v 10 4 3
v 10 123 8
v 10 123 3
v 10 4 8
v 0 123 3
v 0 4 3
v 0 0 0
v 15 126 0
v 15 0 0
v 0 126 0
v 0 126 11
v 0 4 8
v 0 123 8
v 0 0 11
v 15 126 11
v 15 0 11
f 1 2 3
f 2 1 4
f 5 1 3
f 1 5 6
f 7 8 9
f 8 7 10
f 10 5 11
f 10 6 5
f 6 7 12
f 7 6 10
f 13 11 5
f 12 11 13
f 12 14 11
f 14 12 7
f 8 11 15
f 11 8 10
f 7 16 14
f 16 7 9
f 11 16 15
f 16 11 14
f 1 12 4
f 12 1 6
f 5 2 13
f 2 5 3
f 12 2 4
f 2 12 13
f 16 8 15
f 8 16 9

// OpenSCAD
module connector(length=10, width=200, space=5, deep=10){
    
cube([length,width,thick]);

translate([length-deep,0,0])
    cube([deep,4,6+space]);
translate([length-deep,width-thick,0])
    cube([deep,3,6+space]);
}

space=5;
mcx = 100;
mcy = 63;
mcz = 70+space;
thick = 3;
imcx = mcx-2*thick;
imcy = mcy-2*thick;
imcz = mcz-2*thick;
fr=15;
ifr=13;
hf=2;
translate([10,0,0])
cube([5,mcy*2,space+6]);
connector(width=2*mcy);
mirror([0,0,1])  
translate([0,0,-(6+space)])
connector(width=2*mcy);
